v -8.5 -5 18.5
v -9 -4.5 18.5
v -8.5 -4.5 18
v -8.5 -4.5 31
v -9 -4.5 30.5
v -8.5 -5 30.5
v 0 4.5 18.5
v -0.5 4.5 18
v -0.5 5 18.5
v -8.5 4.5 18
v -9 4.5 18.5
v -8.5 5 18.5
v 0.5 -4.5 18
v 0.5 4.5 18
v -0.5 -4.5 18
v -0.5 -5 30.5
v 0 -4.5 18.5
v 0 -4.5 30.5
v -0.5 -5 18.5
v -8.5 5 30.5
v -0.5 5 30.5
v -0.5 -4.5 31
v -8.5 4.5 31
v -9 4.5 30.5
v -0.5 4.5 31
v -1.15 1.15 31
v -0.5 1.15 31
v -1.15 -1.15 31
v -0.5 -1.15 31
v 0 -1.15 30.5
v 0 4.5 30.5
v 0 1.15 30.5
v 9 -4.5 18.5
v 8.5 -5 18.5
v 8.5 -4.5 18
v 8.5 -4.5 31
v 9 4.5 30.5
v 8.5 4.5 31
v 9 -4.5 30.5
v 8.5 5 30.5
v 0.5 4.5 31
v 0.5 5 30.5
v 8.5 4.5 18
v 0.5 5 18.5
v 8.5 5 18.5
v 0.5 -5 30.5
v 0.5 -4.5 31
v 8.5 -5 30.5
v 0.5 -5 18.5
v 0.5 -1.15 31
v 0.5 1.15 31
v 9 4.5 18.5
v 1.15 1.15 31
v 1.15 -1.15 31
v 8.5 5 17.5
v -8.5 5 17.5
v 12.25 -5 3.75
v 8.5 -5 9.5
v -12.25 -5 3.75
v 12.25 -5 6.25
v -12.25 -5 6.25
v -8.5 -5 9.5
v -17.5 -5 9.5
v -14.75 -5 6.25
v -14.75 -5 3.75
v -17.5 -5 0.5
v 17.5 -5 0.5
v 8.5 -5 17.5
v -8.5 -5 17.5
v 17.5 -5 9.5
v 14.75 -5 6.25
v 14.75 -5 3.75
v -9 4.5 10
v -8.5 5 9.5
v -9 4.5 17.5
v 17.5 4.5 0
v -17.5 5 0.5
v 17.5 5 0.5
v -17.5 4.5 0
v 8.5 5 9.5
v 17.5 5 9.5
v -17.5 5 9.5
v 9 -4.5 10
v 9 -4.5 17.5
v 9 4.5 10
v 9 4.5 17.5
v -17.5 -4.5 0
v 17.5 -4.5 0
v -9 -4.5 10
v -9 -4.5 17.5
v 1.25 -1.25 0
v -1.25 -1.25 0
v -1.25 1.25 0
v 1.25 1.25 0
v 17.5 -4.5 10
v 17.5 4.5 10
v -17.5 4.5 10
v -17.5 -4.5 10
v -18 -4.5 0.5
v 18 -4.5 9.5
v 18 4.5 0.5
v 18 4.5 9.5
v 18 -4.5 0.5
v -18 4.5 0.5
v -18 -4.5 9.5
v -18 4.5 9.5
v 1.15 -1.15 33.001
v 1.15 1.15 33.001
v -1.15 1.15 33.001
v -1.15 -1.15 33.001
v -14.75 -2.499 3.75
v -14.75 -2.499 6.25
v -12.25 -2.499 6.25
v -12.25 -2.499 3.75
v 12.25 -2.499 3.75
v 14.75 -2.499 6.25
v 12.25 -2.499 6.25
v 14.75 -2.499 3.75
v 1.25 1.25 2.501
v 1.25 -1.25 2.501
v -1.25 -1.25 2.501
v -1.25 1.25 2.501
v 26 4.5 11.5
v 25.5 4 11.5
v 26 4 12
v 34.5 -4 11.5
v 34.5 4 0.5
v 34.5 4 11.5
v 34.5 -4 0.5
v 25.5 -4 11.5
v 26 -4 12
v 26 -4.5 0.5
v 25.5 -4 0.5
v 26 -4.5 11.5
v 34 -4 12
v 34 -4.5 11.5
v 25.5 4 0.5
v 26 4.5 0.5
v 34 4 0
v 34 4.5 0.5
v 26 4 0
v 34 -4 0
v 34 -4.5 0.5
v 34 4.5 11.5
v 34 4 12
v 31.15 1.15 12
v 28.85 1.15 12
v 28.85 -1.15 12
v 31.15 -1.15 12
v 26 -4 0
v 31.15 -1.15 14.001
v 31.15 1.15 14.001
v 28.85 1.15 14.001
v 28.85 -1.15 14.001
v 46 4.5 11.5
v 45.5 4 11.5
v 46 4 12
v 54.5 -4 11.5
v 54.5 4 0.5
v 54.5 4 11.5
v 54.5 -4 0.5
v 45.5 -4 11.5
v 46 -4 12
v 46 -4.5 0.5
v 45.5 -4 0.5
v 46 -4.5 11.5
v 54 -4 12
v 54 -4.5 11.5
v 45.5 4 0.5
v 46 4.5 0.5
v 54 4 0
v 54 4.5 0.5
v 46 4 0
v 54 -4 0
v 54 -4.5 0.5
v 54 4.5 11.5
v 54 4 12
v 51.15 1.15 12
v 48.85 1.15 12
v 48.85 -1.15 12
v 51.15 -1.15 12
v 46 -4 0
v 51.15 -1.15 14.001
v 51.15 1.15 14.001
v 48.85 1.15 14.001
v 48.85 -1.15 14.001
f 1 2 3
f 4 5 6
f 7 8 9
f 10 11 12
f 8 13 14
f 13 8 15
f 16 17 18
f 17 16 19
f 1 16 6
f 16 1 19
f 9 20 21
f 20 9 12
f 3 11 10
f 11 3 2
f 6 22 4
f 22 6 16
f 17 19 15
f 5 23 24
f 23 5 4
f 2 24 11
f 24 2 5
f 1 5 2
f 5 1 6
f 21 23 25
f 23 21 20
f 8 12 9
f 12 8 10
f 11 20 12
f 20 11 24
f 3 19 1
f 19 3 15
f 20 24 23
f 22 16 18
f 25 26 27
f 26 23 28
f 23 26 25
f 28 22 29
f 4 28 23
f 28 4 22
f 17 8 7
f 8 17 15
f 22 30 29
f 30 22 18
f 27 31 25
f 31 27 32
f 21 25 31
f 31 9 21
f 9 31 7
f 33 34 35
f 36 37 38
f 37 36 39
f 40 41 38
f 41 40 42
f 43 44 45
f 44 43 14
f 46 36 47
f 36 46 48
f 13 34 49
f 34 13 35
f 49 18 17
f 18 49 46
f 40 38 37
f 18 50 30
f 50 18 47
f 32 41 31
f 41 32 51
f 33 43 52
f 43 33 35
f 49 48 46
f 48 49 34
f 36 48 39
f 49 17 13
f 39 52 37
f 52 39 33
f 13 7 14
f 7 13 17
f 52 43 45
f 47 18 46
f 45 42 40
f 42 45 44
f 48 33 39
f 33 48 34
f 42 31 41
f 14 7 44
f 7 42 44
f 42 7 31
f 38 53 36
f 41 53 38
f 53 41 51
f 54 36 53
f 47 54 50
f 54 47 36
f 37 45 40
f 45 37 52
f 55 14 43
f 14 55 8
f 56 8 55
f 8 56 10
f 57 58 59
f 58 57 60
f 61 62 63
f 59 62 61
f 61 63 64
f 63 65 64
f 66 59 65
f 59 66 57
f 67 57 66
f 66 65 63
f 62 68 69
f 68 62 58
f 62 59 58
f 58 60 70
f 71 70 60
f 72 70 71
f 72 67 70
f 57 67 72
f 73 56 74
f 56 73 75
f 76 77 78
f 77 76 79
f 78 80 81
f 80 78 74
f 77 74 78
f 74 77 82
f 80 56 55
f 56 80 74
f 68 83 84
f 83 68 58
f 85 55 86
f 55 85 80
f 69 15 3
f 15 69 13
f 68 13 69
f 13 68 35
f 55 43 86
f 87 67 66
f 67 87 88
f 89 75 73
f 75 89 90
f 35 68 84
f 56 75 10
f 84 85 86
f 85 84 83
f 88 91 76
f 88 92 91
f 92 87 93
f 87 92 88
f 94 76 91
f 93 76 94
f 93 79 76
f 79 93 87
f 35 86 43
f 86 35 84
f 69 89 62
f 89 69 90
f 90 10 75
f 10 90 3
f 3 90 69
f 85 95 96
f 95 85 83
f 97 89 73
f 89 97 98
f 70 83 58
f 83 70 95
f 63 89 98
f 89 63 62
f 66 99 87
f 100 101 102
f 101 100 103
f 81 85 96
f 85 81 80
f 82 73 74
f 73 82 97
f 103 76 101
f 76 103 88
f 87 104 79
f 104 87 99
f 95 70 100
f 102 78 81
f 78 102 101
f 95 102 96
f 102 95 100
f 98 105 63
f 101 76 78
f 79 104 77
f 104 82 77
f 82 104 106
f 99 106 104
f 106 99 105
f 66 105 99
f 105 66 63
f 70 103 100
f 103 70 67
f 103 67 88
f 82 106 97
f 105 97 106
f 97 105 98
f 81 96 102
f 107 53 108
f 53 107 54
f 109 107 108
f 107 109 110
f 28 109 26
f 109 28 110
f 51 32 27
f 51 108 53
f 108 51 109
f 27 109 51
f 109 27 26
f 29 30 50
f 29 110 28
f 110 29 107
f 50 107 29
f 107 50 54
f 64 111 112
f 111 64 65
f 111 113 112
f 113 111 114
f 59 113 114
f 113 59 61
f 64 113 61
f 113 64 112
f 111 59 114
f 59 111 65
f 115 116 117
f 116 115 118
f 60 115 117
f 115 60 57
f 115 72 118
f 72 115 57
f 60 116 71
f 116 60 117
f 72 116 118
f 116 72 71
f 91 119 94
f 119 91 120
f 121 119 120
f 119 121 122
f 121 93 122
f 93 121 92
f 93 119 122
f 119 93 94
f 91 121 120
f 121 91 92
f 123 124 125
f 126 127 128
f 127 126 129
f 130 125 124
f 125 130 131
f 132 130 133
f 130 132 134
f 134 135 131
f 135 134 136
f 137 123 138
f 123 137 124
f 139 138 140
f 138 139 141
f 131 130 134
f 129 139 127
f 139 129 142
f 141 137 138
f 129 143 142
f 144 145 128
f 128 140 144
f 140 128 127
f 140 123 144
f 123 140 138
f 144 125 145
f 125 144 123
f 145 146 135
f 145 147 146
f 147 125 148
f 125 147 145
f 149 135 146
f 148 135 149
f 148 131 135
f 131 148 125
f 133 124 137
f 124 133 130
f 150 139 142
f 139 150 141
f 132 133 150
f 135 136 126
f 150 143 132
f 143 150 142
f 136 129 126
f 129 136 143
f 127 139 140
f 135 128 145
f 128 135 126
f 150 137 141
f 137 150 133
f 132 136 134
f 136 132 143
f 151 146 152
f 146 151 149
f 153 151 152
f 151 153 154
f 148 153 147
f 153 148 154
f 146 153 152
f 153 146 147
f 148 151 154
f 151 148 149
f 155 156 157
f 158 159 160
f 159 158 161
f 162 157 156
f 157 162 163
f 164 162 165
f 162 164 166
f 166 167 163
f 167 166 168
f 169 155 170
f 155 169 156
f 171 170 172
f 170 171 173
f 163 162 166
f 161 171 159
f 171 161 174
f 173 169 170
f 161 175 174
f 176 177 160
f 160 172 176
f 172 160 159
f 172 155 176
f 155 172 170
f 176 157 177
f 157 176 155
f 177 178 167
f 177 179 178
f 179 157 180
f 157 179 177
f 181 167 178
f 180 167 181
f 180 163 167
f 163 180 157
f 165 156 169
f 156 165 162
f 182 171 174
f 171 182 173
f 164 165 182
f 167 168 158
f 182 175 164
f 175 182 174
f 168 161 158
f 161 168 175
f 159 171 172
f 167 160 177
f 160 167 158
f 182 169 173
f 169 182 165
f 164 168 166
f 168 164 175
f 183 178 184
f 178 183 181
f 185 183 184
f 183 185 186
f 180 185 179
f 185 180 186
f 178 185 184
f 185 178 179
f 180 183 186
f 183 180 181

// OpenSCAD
// file: head.scad
include <common.scad>

// Studs are 1.7mm high and 3mm in diameter. They are spaced
// 2mm in from the edges of an 18x18mm square.
module four_studs() {
  column_height = 1.1;
  radius = 1.5;
  displacement = 5.5;
  
  for (a = [-1, 1], b = [-1, 1]) {
    scale([a, b, 1]) {
      translate([displacement, displacement, 0]) {
        cylinder(column_height+eps, radius, radius);
        translate([0, 0, column_height])
          cylinder(0.5, radius, radius-0.5);
      }
    }
  }
}

module four_holes() {
  loose_hole()
    four_studs();
}

// A stackable box, 18x18mm, with optional studs and holes.
module stackable_box(height, studs=true, holes=true) {
  difference() {
    union() {
      chamfered_box([18, 18, height]);
      if (studs)
        translate([0, 0, height - eps])
          four_studs();
    }
    if (holes)
      translate([0, 0, -eps])
        four_holes();
  }
}

// A stackable chip, for going on top of a head.
module chip() {
  stackable_box(3.5);
}

// A head, which is intended to have 2 chips stacked on top.
module head(face_raster) {
  difference() {
    // A 10mm head plus two 3.5mm chips comes to 17mm,
    // which is slightly less than the 18mm width. That's
    // by design. It looks better not to have such tall heads,
    // perhaps because the studs on top give the illusion
    // of added height.
    stackable_box(10, holes=false);
    
    // Bring the mask out a bit extra (0.05mm) to avoid
    // having it intersect the studs at all.
    translate([0, -9.05, 0])
      face(face_raster);
    
    locking_socket();
  }
}

// 'raster' is an array of 5 rows, where each row has 8
// elements. Each element should be in [0, 1]. A '1' means the
// given position will be fully engraved on the face.
// Returns a mask which should be subtracted from the head.
// The Z axis will coincide with the centerline of the 
// mask's front.
module face(raster) {
  // Below we use a unit of 1 to represent one pixel on
  // the face. Scale up to an 18mm face, 8 pixels wide.
  scale([2.25, 2.25, 2.25]) {
    translate([-4, -eps, -eps]) {
      difference() {
        // Begin with a filled-in face plate.
        translate([-eps, -eps, -eps])
          cube([8+2*eps, 0.9+2*eps, 5+2*eps]);
        
        // Subtract the material which needs to remain on the
        // head. Leave some support under each shelf.
        for (r = [0:4])
          for (c = [0:7])
            translate([c-eps, raster[r][c]-eps, 4-r-eps])
              rotate([90, 0, 90])
                translate([0, 0, -2*eps])
                  linear_extrude(1+4*eps)
                    polygon([
                      [   -2*eps,     -2*eps],
                      [0.9+2*eps, -0.5-2*eps],
                      [0.9+2*eps,    1+2*eps],
                      [   -2*eps,    1+2*eps],
                    ]);
      }
    }
  }
}

module creeper_head() {
  difference() {
    head([
      [0, 1, 1, 0, 0, 1, 1, 0],
      [0, 1, 1, 0, 0, 1, 1, 0],
      [0, 0, 0, 1, 1, 0, 0, 0],
      [0, 0, 1, 1, 1, 1, 0, 0],
      [0, 0, 1, 0, 0, 1, 0, 0],
    ]);
  }
}

module zombie_head() {
  difference() {
    head([
      [0, 0, 0,   0,   0,   0,   0, 0],
      [0, 1, 1,   0,   0,   1,   1, 0],
      [0, 0, 0,   0.7, 0.7, 0,   0, 0],
      [0, 0, 0.2, 0,   0,   0.2, 0, 0],
      [0, 0, 0.2, 0,   0,   0.2, 0, 0],
    ]);
  }
}

module skeleton_head() {
  difference() {
    head([
      [0, 0, 0, 0, 0, 0, 0, 0],
      [0, 1, 1, 0, 0, 1, 1, 0],
      [0, 0, 0, 1, 1, 0, 0, 0],
      [0, 1, 1, 1, 1, 1, 1, 0],
      [0, 0, 0, 0, 0, 0, 0, 0],
    ]);
  }
}

module spider_head() {
  difference() {
    head([
      [1, 0, 0, 0, 0, 0, 0, 1],
      [1, 0, 1, 1, 1, 1, 0, 1],
      [0, 0, 1, 1, 1, 1, 0, 0],
      [0, 0, 0, 0, 0, 0, 0, 0],
      [0, 0, 1, 0, 0, 1, 0, 0],
    ]);
  }
}

// Demo.
skeleton_head();
// file: base.scad
include <common.scad>

module ring() {
  rotate_extrude(angle=360)
    translate([12, 0, 0])
      polygon([
        [0, 0],
        [3, 0],
        [3, 1.1],
        [2.5, 1.6],
        [0.5, 1.6],
        [0, 1.1],
      ]);
}

module ring_hole() {
  loose_hole()
    ring();
}

module base() {
  difference() {
    chamfered_disk(3.5, 20);
    ring_hole();
  }
}

module base_chip() {
  base();
  translate([0, 0, 3.5])
    ring();
}

// Demo.
base_chip();
// file: common.scad
// Unless otherwise specified, each resulting shape is
// resting on the XY plane, centered on the Z axis.

// A small amount to make sure shapes overlap when needed. This
// is well below the resolution of my 3D printer, so it
// shouldn't affect the final result.
eps = 0.001;

// These are reasonable settings for interactive renderings,
// but we might want something finer for printing.
$fa = 20;
$fs = 0.4;

// Standard chamfer on all edges and corners. This makes the
// pieces more comfortable to handle.
chamfer = 0.5;

// A regular octahedron centered on the origin with its vertices
// on the axes. 'axis' gives its full length along each axis.
module octahedron(axis) {
  // Top and bottom halves.
  for (a = [-1, 1])
    scale([1, 1, a])
      // Extrude a square into a pyramid.
      linear_extrude(axis/2, scale=0)
        rotate([0, 0, 45])
          square(norm([axis/2, axis/2]), center=true);
}

// 'd' is the outer dimensions of the box.
module chamfered_box(d) {
  assert(d.x >= 1);
  assert(d.y >= 1);
  assert(d.z >= 1);

  // Raise the result up so it is resting on the XY plane.
  translate([0, 0, d.z/2]) {
    minkowski() {
      // The desired cube, scaled back by the chamfer distance
      // in all directions.
      cube(d - [chamfer*2, chamfer*2, chamfer*2], center=true);
      octahedron(chamfer*2);
    }
  }
}

module chamfered_disk(height, radius) {
  assert(radius >= 0.5);
  assert(height >= 1);

  // Raise the result up so it is resting on the XY plane.
  translate([0, 0, height/2]) {
    minkowski() {
      // The desired disk, scaled back by the chamfer distance
      // in all directions.
      cylinder(height-chamfer*2, r=radius-chamfer, center=true);
      octahedron(chamfer*2);
    }
  }
}

// Holes are designed to loosely fit over the studs.
module loose_hole() {
  minkowski() {
    children(0);
    sphere(0.5);
  }
}

locking_lug_dims = [2.3, 2.3, 2+2*eps];

// A snug fit for gluing.
module locking_lug() {
  translate([0, 0, locking_lug_dims.z/2-eps])
    cube(locking_lug_dims, center=true);
}
module locking_socket() {
  translate([0, 0, locking_lug_dims.z/2+0.25-eps])
    cube(locking_lug_dims + [0.2, 0.2, 0.5], center=true);
}
// main file
include <common.scad>
use <base.scad>
use <head.scad>

// TODO: these lugs are probably off center.

module basic_body(zombie_arms=true) {
  difference() {
    torso_breadth = 18;
    torso_height = 18;
    leg_height = 13;
    shoulder_height = 10;

    union() {
      // Torso.
      chamfered_box([torso_breadth, 10, torso_height]);

      // Shoulders.
      chamfered_box([
        torso_breadth*2, shoulder_height, shoulder_height]);

      // Legs.
      for (a = [-1, 1])
        scale([a, 1, 1])
          translate([4.5, 0, torso_height])
            chamfered_box([9, 10, leg_height]);
      
      // Baseplate locking lug.
      translate([0, 0, torso_height+leg_height])
        locking_lug();
      // Fill in the chamfer between the feet and the lug.
      translate([0, 0, torso_height+leg_height-1])
        locking_lug();
    }
    
    // Head locking socket.
    locking_socket();
    
    // Arm locking sockets.
    for (a = [-1, 1]) 
      scale([a, 1, 1])
        if (zombie_arms) {
          translate([
            torso_breadth/2+4.5,
            -shoulder_height/2,
            shoulder_height/2
          ])
            rotate([90, 0, 0])
              scale([1, 1, -1])
                locking_socket();
        } else {
          translate([torso_breadth/2+4.5, 0, shoulder_height])
            scale([1, 1, -1])
              locking_socket();
        }
  }
}

module arm(length=12) {
  chamfered_box([9, 9, length]);
  
  // Locking lug.
  translate([0, 0, length])
    locking_lug();
}

basic_body();

// Print a pair of arms.
translate([30, 0, 0]) {
  arm();
  translate([20, 0, 0]) {
    arm();
  }
}
